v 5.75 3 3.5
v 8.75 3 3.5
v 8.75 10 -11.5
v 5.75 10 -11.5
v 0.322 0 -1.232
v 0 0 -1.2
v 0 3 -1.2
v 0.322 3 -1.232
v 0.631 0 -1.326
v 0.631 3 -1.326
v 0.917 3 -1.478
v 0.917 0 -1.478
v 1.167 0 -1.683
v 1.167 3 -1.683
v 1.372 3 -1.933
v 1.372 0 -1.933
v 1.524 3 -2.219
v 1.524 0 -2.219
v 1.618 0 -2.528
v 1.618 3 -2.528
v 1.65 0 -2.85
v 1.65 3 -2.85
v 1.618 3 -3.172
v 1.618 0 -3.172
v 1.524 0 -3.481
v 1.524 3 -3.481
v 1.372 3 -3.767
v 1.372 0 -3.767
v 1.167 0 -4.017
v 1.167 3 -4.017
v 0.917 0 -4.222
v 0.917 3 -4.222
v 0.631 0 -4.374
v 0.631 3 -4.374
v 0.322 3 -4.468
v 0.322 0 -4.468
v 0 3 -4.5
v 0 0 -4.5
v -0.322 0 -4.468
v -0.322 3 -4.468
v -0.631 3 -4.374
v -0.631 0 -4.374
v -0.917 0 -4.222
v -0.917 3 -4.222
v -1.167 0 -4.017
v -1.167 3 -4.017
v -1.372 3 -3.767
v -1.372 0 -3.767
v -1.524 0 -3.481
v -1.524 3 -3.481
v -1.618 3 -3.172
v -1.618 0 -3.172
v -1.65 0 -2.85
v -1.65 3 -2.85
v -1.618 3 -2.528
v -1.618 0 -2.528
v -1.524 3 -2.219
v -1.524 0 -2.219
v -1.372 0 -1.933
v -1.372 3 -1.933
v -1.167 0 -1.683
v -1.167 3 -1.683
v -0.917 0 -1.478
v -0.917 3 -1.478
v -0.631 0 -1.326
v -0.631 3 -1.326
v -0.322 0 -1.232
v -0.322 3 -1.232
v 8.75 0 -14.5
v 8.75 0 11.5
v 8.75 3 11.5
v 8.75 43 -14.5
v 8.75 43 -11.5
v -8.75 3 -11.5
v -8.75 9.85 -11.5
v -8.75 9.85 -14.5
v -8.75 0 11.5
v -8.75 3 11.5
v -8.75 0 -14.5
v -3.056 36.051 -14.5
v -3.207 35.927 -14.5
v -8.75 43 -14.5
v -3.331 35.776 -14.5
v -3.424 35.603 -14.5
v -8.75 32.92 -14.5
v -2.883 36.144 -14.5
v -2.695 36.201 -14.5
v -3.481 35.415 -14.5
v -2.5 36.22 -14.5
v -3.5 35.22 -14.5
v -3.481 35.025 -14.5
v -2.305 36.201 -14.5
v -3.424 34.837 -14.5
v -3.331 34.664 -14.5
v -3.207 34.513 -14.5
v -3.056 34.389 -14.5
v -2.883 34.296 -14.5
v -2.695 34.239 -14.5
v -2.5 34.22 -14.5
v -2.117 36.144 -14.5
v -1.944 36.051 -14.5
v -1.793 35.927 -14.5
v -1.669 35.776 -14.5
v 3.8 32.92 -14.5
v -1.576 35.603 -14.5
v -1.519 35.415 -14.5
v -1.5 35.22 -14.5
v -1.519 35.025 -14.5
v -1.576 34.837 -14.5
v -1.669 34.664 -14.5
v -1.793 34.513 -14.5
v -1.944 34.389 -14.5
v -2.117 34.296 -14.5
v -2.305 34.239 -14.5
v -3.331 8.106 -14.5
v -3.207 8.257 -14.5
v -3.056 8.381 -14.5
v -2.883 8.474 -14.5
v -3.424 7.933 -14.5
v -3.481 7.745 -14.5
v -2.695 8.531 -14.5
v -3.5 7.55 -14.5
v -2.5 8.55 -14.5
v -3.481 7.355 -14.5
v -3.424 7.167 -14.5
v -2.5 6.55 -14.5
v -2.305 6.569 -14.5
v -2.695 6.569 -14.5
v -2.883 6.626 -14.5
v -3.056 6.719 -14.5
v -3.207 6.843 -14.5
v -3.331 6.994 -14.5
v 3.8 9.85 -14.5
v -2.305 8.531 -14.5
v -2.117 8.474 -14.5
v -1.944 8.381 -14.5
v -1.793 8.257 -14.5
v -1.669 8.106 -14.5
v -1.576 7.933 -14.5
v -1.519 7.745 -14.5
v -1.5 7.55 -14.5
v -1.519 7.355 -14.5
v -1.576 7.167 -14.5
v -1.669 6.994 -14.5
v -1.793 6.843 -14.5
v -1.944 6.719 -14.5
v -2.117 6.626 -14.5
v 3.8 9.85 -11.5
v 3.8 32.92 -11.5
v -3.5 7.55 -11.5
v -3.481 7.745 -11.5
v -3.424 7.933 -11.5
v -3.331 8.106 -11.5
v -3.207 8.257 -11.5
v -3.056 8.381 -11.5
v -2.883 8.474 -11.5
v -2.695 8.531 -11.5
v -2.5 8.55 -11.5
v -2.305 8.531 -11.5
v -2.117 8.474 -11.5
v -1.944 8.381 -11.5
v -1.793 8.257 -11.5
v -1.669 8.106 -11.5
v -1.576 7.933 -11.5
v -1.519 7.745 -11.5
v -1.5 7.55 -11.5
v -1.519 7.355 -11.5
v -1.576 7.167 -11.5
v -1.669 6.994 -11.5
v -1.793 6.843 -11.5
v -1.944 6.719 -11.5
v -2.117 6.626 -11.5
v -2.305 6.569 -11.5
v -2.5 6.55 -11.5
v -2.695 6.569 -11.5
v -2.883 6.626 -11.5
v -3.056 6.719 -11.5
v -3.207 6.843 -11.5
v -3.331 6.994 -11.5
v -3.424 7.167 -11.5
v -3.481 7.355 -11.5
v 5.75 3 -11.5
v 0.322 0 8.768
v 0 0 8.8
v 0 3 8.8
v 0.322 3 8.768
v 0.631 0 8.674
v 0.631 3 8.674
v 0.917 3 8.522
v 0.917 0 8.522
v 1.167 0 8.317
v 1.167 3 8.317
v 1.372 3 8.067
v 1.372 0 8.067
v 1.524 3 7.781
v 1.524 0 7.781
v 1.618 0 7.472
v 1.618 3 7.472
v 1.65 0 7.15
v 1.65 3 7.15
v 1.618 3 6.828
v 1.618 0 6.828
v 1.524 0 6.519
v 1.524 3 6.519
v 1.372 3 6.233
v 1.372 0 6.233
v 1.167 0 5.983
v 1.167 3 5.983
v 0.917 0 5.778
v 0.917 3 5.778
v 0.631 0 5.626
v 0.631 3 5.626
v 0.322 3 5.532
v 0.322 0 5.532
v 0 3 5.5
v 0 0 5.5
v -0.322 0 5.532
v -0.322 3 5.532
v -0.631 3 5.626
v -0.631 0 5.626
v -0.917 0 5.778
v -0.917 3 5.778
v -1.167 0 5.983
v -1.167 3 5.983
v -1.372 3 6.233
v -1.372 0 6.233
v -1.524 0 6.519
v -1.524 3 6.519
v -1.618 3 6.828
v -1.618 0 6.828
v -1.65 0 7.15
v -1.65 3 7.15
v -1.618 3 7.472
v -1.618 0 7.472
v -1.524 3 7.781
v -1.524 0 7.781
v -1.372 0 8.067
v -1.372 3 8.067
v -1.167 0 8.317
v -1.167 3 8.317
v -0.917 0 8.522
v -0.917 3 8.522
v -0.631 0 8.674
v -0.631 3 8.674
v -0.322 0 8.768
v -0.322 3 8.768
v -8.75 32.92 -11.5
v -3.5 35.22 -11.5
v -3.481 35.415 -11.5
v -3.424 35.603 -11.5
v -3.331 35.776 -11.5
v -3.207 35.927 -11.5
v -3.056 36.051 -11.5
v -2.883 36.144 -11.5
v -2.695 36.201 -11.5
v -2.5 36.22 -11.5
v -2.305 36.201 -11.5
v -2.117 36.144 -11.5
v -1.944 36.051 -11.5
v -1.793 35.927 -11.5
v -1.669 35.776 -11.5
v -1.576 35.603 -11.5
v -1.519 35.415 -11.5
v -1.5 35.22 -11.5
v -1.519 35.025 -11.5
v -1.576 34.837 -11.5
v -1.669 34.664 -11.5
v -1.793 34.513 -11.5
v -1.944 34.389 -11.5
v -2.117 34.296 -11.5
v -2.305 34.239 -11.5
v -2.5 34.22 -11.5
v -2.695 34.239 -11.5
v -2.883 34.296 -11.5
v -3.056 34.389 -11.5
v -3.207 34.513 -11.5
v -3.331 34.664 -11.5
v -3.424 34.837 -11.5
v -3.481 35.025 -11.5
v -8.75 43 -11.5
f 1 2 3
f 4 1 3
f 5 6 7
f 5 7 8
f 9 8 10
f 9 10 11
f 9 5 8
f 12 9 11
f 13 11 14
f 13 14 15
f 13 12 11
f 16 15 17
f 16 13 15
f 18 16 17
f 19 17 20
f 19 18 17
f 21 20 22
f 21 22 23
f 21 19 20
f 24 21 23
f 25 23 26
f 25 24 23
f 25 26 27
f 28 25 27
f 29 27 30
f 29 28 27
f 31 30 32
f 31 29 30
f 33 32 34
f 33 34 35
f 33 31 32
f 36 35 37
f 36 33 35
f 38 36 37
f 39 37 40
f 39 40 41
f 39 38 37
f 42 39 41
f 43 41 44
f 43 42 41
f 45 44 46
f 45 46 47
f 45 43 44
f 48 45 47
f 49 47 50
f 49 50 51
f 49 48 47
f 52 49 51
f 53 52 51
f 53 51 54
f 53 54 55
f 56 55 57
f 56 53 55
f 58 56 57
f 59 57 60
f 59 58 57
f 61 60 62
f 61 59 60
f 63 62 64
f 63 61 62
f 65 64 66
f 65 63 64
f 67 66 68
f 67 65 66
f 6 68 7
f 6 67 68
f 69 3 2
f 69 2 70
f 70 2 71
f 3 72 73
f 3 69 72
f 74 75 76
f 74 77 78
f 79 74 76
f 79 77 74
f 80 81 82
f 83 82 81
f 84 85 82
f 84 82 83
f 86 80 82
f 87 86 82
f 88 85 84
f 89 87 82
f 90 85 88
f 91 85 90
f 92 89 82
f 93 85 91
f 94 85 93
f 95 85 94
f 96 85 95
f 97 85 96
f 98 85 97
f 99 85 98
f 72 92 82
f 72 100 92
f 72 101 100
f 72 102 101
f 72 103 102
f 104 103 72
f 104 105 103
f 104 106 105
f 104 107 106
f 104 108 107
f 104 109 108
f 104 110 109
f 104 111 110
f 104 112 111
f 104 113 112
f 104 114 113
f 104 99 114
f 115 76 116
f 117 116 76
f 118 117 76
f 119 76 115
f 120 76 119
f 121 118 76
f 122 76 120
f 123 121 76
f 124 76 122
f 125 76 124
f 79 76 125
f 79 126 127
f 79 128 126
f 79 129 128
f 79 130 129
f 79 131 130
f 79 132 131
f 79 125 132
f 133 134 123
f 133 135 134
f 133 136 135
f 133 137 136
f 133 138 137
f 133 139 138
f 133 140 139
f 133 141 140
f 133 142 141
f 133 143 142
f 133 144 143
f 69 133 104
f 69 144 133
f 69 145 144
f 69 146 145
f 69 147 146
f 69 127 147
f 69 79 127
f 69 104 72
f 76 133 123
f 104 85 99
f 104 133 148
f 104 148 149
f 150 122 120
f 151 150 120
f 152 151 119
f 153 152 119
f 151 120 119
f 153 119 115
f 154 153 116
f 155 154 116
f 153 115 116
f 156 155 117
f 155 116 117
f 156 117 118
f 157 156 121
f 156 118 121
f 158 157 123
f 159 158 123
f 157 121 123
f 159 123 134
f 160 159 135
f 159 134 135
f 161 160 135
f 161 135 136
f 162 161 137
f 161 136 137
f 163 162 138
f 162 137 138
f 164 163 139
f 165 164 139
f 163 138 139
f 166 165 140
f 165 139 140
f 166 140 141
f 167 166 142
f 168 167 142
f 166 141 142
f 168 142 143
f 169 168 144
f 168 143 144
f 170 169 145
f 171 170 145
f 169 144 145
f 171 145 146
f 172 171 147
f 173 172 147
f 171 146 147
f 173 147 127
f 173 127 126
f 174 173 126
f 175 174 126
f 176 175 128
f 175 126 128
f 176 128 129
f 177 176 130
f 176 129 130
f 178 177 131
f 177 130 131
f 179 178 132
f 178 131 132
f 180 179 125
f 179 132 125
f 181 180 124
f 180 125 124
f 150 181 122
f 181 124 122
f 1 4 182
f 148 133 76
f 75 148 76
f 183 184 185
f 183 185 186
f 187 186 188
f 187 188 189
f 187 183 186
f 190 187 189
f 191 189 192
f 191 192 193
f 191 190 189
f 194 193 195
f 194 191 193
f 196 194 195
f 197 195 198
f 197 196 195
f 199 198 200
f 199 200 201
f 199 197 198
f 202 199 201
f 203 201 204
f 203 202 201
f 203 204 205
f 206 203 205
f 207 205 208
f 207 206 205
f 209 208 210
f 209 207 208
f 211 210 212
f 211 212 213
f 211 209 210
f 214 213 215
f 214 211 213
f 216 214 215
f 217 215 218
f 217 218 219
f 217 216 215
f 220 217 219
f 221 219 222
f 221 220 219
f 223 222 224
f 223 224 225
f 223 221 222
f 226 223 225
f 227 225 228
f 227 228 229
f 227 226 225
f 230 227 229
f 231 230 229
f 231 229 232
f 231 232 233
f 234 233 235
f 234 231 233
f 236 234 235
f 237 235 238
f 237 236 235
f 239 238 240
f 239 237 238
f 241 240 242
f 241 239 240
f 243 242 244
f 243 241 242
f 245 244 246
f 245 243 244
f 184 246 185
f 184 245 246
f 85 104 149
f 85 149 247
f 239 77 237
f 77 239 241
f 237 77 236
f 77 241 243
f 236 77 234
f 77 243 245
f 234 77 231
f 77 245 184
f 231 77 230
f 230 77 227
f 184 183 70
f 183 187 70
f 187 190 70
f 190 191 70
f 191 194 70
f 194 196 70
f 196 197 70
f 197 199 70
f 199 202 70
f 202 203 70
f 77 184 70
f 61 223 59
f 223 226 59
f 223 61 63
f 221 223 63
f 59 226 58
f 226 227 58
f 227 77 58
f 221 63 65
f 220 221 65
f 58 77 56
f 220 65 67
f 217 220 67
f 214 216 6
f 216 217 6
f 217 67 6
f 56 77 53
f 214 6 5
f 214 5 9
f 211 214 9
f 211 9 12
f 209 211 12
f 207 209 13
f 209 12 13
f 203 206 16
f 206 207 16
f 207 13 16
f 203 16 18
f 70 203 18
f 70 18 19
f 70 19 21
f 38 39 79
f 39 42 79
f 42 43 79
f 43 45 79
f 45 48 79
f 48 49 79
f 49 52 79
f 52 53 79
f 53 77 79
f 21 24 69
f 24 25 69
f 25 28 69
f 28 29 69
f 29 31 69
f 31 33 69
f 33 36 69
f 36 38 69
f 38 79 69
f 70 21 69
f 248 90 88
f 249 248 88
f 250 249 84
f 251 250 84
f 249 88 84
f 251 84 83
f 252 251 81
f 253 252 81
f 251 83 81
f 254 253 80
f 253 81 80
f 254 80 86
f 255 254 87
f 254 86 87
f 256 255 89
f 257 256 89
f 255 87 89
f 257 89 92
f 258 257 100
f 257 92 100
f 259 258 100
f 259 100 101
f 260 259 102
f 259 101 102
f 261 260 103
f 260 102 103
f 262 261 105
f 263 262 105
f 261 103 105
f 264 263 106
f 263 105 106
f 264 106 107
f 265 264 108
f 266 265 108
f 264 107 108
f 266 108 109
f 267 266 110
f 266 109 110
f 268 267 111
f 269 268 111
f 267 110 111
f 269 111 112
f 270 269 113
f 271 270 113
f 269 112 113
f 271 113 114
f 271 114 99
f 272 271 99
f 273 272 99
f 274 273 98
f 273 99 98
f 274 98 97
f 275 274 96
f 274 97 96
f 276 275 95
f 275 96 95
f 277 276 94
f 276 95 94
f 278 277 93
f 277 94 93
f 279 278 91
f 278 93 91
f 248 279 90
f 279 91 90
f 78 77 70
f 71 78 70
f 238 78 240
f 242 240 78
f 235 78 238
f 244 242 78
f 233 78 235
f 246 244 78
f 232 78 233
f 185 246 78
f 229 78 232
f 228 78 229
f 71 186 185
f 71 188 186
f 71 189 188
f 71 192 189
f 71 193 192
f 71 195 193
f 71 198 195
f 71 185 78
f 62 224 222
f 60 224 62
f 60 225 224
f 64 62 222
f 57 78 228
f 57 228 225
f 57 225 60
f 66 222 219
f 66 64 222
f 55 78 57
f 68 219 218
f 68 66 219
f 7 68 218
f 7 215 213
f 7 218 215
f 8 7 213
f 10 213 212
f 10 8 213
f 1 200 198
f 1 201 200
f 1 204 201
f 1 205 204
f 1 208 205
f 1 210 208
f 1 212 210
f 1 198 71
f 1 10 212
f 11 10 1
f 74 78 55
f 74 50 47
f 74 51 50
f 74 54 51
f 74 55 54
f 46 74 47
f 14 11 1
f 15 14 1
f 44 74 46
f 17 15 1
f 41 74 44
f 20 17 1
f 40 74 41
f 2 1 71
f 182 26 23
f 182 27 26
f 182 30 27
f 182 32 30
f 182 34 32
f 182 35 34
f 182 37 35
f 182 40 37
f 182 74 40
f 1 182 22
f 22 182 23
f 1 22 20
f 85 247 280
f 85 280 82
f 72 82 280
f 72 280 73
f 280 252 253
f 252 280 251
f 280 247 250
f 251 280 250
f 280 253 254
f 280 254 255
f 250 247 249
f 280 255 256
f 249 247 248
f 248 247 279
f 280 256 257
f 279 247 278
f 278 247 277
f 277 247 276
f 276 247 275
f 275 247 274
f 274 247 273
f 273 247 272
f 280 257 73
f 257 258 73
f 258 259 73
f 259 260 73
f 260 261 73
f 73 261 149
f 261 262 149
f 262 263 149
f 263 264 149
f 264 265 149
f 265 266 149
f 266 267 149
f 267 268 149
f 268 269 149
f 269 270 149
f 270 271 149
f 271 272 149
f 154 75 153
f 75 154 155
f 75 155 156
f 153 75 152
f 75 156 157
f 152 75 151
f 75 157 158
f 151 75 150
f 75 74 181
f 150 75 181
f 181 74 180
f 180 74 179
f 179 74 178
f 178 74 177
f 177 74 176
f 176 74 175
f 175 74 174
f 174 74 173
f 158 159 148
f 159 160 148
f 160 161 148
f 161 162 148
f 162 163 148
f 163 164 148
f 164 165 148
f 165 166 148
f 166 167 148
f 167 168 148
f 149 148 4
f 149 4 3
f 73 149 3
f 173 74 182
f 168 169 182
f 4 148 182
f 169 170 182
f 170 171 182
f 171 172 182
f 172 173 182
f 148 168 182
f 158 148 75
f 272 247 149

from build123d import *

# Parameters (mm, degrees)
SKETCH_1_W          = 17.5
SKETCH_1_H          = 23
SKETCH_1_R          = 1.65
EXTRUDE_1_DEPTH     = 3
SKETCH_2_W          = 17.5
SKETCH_2_H          = 3
EXTRUDE_2_DEPTH     = 43
SKETCH_3_R          = 1
SKETCH_3_W          = 12.55
SKETCH_3_H          = 23.07
CUT_EXTRUDE_1_DEPTH = 3
EXTRUDE_3_DEPTH     = 3


with BuildPart() as part:
    # 草图1 → 凸台-拉伸1 (new body)
    with BuildSketch(Plane(origin=(0, 0, 0), x_dir=(1, 0, 0), z_dir=(0, 1, 0))):
        Rectangle(SKETCH_1_W, SKETCH_1_H)
        with Locations(Location((0, 2.85, 0), (0, 0, 270))):
            Circle(SKETCH_1_R, mode=Mode.SUBTRACT)
        with Locations(Location((0, -7.15, 0), (0, 0, 270))):
            Circle(SKETCH_1_R, mode=Mode.SUBTRACT)
    extrude(amount=EXTRUDE_1_DEPTH)

    # 草图2 → 凸台-拉伸2 (add)
    with BuildSketch(Plane(origin=(0, 0, 0), x_dir=(1, 0, 0), z_dir=(0, 1, 0))):
        with Locations((0, 13)):
            Rectangle(SKETCH_2_W, SKETCH_2_H)
    extrude(amount=EXTRUDE_2_DEPTH)

    # 草图3 → 切除-拉伸1 (cut)
    with BuildSketch(Plane(origin=(0, 0, -14.5), x_dir=(-1, 0, 0), z_dir=(0, 0, -1))):
        with Locations((2.5, 7.55)):
            Circle(SKETCH_3_R)
        with Locations((2.5, 35.22)):
            Circle(SKETCH_3_R)
        with Locations((2.475, 21.385)):
            Rectangle(SKETCH_3_W, SKETCH_3_H)
    extrude(amount=-CUT_EXTRUDE_1_DEPTH, mode=Mode.SUBTRACT)

    # 草图4 → 凸台-拉伸3 (add)
    with BuildSketch(Plane(origin=(8.75, 0, 0), x_dir=(0, 0, -1), z_dir=(1, 0, 0))):
        Polygon((11.5, 3), (-3.5, 3), (11.5, 10), align=None)
    extrude(amount=-EXTRUDE_3_DEPTH)


solid = part.part
